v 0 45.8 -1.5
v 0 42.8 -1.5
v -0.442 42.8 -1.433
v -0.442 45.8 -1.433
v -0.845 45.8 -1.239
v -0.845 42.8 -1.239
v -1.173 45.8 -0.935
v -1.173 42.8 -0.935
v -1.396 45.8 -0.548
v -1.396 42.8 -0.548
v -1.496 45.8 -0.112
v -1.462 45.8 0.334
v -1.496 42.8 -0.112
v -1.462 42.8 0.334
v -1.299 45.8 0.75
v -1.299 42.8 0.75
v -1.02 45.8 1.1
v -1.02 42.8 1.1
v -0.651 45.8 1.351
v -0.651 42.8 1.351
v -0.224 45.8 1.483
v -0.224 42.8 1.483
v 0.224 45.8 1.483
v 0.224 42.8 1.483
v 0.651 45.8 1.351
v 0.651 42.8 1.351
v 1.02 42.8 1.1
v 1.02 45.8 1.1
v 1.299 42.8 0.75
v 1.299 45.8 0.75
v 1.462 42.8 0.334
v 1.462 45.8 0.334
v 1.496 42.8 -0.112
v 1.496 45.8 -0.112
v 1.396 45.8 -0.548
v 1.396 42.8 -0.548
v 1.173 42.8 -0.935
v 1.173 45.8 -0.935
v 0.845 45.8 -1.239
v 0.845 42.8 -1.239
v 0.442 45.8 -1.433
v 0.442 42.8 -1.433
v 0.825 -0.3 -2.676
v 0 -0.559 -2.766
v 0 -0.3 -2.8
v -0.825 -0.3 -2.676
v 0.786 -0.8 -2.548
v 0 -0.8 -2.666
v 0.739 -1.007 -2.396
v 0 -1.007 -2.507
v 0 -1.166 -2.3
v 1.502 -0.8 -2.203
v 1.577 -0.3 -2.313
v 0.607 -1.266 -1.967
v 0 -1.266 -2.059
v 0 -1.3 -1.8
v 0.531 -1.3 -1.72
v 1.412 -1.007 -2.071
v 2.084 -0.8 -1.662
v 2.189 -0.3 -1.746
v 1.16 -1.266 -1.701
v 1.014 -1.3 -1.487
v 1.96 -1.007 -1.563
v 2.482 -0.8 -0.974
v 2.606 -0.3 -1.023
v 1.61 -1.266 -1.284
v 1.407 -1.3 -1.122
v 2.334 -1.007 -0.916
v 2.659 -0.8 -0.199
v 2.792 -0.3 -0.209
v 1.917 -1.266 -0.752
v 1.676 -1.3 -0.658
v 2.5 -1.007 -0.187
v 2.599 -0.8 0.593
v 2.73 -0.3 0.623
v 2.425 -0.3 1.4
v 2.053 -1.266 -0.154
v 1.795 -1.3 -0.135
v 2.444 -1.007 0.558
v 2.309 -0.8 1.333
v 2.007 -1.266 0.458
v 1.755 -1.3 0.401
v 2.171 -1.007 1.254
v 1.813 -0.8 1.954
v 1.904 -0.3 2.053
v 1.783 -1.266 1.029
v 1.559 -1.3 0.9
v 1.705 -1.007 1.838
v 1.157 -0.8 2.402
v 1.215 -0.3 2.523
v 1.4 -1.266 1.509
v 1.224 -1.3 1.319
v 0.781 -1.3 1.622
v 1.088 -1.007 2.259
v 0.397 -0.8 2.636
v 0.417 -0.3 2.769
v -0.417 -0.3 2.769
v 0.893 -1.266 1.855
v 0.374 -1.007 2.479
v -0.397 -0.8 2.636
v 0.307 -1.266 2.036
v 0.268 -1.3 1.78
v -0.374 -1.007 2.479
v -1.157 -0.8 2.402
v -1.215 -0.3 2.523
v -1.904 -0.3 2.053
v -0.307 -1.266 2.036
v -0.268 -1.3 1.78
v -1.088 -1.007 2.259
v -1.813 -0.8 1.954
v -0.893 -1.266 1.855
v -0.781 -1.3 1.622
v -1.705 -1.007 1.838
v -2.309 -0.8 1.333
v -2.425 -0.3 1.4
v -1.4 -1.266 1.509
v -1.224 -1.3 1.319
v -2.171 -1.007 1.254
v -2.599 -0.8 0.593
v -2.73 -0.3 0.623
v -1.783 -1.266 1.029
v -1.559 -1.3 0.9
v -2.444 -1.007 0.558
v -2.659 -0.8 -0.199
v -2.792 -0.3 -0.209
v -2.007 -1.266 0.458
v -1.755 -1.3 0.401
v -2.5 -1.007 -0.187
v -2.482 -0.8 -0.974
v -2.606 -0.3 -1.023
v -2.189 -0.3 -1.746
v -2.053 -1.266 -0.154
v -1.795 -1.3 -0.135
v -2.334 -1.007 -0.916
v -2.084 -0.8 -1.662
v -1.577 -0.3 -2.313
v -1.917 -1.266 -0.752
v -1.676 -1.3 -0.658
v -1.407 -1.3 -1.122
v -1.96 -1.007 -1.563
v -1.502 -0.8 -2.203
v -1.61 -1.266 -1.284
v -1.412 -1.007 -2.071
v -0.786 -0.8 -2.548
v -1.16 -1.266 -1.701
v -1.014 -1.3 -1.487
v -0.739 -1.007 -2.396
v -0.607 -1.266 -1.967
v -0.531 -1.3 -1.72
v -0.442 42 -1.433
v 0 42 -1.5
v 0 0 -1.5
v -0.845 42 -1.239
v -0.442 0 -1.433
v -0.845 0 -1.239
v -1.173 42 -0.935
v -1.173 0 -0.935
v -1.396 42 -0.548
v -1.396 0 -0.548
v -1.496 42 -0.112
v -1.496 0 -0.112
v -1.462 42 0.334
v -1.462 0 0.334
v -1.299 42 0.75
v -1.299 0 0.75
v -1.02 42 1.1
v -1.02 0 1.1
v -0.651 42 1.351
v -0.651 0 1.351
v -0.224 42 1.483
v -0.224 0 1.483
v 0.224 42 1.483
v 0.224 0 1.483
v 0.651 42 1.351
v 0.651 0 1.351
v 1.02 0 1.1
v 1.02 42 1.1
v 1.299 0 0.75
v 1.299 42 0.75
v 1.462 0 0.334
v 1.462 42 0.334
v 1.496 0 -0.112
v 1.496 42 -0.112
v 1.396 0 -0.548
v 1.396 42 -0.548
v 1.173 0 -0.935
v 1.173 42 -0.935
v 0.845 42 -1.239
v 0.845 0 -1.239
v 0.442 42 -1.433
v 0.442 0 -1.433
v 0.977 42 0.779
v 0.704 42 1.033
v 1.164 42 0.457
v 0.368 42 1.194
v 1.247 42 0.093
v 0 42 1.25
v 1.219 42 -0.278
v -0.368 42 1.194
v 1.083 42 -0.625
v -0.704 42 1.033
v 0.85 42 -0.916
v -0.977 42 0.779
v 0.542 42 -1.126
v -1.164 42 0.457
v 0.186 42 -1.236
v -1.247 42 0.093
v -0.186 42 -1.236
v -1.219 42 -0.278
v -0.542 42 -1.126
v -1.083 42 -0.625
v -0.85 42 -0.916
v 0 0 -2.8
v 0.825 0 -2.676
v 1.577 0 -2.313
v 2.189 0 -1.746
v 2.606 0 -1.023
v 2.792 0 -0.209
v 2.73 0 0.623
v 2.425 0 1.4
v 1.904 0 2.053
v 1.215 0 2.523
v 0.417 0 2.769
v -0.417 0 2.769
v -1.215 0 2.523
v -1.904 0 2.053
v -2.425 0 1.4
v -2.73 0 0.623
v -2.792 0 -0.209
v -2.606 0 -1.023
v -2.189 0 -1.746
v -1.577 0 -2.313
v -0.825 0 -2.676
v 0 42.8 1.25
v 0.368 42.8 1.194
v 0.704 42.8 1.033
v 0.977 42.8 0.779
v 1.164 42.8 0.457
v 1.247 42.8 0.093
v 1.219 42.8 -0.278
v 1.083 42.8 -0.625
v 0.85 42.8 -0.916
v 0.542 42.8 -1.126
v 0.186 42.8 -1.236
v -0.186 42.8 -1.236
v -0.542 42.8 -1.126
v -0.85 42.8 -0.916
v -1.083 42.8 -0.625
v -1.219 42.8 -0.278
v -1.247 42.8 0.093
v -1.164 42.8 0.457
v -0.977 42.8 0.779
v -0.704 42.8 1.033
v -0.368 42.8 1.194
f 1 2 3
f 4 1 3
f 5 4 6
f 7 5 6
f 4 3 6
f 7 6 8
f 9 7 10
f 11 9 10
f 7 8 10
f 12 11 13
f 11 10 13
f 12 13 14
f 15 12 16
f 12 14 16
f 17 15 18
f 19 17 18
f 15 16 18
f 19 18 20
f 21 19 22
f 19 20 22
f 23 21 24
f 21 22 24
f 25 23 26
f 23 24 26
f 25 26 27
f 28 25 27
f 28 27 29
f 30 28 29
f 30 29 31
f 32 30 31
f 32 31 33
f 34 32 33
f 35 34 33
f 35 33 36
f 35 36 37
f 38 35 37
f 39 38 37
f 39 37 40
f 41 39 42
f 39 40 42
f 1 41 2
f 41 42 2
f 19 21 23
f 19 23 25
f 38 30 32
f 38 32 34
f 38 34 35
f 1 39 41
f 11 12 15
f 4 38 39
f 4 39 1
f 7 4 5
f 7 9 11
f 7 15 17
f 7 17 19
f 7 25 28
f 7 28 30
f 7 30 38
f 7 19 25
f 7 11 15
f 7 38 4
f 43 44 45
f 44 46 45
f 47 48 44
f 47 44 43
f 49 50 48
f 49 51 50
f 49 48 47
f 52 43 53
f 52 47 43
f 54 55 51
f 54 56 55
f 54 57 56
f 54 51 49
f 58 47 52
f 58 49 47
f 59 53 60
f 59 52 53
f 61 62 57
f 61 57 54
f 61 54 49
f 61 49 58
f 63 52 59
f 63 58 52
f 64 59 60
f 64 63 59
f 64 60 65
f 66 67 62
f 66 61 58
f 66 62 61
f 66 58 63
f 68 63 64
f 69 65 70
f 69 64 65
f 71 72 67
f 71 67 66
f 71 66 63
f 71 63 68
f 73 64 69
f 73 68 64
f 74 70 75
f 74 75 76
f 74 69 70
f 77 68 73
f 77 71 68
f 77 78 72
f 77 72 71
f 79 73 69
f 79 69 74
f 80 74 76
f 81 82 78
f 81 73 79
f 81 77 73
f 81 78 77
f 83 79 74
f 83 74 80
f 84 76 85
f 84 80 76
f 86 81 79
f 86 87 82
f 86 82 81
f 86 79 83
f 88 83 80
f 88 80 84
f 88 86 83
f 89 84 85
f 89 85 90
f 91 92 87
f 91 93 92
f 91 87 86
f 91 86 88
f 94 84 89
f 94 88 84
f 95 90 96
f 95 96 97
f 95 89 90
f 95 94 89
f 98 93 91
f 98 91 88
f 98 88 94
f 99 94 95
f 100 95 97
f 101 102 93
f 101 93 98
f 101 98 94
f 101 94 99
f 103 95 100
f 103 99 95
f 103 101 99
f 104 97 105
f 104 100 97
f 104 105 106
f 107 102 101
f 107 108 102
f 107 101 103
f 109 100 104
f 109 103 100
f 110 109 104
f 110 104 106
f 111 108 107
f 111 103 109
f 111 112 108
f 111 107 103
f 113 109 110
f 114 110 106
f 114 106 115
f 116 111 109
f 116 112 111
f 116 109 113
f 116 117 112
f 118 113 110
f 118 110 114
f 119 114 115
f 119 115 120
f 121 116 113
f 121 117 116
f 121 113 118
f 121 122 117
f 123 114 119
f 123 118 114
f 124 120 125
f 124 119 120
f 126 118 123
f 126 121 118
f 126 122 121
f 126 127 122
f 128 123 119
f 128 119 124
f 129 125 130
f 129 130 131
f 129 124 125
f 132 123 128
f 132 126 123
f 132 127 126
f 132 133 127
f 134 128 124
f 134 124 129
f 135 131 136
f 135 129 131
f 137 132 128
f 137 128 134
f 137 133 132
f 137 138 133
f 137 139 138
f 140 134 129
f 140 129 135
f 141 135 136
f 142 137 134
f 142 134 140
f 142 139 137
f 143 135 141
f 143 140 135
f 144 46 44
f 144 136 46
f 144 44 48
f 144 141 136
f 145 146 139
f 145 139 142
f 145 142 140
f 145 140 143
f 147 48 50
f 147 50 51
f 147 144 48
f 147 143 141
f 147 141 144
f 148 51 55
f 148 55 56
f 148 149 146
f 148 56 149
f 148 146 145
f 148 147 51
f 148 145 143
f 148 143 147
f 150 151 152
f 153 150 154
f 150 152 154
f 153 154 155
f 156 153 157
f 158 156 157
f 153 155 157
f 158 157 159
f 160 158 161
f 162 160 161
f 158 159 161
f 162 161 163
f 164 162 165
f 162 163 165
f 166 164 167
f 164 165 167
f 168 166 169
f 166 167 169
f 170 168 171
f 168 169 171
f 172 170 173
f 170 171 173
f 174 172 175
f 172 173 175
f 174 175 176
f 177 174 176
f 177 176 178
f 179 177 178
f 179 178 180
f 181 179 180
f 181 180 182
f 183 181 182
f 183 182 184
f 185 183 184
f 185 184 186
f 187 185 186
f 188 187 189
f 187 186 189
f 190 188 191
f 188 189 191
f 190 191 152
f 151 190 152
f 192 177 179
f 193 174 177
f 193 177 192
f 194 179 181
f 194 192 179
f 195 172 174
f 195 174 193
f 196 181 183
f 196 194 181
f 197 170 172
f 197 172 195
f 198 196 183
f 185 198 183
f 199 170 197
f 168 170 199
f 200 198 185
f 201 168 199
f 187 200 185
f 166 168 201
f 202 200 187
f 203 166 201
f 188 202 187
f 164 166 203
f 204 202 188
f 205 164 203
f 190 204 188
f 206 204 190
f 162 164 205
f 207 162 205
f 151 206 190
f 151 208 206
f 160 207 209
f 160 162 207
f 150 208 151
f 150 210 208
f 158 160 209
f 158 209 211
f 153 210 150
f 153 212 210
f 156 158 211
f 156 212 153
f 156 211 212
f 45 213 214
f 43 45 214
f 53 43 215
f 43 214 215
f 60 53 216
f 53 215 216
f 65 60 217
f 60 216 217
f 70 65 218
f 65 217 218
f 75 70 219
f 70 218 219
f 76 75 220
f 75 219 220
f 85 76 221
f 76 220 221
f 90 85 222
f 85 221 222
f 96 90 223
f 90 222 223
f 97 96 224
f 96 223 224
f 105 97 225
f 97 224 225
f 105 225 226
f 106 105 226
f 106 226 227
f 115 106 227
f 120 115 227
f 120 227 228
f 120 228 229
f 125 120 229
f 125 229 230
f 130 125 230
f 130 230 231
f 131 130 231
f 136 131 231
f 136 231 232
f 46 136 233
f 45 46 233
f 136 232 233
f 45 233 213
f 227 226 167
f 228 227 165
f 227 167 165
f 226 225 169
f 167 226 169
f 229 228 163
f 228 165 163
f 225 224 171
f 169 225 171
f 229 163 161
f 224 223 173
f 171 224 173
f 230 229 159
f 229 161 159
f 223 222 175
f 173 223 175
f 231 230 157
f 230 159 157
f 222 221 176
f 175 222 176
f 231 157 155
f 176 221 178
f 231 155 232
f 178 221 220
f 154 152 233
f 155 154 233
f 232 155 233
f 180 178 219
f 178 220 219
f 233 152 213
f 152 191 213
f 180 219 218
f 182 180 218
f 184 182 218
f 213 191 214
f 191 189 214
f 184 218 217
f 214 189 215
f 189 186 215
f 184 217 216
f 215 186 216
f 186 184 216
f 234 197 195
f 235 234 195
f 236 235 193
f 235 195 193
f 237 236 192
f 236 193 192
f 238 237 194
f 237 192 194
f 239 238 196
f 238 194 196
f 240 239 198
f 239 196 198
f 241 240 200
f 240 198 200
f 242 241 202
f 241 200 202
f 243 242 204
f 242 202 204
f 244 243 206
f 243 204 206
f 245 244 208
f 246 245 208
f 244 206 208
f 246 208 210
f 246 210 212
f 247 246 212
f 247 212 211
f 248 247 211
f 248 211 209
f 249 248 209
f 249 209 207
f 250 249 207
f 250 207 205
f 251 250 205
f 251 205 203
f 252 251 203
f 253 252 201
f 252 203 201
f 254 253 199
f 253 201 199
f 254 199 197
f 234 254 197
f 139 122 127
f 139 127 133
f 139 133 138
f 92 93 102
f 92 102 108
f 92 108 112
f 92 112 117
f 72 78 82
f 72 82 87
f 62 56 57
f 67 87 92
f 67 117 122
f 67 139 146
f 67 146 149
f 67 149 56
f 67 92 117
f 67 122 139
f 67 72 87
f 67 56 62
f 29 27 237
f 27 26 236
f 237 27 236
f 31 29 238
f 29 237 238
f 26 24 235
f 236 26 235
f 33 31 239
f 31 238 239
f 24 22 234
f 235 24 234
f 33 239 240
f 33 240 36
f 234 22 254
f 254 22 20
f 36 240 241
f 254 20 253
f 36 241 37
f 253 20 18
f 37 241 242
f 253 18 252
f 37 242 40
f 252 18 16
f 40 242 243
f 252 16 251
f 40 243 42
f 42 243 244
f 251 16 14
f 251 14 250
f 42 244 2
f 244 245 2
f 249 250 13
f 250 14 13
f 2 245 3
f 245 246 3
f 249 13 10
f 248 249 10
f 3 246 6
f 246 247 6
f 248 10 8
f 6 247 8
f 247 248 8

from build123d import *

# Parameters (mm, degrees)
SKETCH_1_R      = 1.5
EXTRUDE_1_DEPTH = 42
SKETCH_2_R      = 1.25
EXTRUDE_2_DEPTH = 0.8
SKETCH_3_R      = 1.5
EXTRUDE_3_DEPTH = 3
SKETCH_4_R      = 2.8
EXTRUDE_4_DEPTH = 1.3
FILLET_1_R      = 1


with BuildPart() as part:
    # 草图1 → 凸台-拉伸1 (new body)
    with BuildSketch(Plane(origin=(0, 0, 0), x_dir=(1, 0, 0), z_dir=(0, 1, 0))):
        with Locations(Location((0, 0, 0), (0, 0, 90))):
            Circle(SKETCH_1_R)
    extrude(amount=EXTRUDE_1_DEPTH)

    # 草图2 → 凸台-拉伸2 (add)
    with BuildSketch(Plane(origin=(0, 42, 0), x_dir=(1, 0, 0), z_dir=(0, 1, 0))):
        with Locations(Location((0, 0, 0), (0, 0, 270))):
            Circle(SKETCH_2_R)
    extrude(amount=EXTRUDE_2_DEPTH)

    # 草图3 → 凸台-拉伸3 (add)
    with BuildSketch(Plane(origin=(0, 42.8, 0), x_dir=(1, 0, 0), z_dir=(0, 1, 0))):
        with Locations(Location((0, 0, 0), (0, 0, 90))):
            Circle(SKETCH_3_R)
    extrude(amount=EXTRUDE_3_DEPTH)

    # 草图4 → 凸台-拉伸4 (add)
    with BuildSketch(Plane.XZ):
        with Locations(Location((0, 0, 0), (0, 0, 270))):
            Circle(SKETCH_4_R)
    extrude(amount=EXTRUDE_4_DEPTH)

    # 圆角1
    fillet_1_edges = [part.edges().sort_by_distance(p)[0] for p in [
        (0, -1.3, 2.8),
    ]]
    fillet(fillet_1_edges, radius=FILLET_1_R)


solid = part.part
